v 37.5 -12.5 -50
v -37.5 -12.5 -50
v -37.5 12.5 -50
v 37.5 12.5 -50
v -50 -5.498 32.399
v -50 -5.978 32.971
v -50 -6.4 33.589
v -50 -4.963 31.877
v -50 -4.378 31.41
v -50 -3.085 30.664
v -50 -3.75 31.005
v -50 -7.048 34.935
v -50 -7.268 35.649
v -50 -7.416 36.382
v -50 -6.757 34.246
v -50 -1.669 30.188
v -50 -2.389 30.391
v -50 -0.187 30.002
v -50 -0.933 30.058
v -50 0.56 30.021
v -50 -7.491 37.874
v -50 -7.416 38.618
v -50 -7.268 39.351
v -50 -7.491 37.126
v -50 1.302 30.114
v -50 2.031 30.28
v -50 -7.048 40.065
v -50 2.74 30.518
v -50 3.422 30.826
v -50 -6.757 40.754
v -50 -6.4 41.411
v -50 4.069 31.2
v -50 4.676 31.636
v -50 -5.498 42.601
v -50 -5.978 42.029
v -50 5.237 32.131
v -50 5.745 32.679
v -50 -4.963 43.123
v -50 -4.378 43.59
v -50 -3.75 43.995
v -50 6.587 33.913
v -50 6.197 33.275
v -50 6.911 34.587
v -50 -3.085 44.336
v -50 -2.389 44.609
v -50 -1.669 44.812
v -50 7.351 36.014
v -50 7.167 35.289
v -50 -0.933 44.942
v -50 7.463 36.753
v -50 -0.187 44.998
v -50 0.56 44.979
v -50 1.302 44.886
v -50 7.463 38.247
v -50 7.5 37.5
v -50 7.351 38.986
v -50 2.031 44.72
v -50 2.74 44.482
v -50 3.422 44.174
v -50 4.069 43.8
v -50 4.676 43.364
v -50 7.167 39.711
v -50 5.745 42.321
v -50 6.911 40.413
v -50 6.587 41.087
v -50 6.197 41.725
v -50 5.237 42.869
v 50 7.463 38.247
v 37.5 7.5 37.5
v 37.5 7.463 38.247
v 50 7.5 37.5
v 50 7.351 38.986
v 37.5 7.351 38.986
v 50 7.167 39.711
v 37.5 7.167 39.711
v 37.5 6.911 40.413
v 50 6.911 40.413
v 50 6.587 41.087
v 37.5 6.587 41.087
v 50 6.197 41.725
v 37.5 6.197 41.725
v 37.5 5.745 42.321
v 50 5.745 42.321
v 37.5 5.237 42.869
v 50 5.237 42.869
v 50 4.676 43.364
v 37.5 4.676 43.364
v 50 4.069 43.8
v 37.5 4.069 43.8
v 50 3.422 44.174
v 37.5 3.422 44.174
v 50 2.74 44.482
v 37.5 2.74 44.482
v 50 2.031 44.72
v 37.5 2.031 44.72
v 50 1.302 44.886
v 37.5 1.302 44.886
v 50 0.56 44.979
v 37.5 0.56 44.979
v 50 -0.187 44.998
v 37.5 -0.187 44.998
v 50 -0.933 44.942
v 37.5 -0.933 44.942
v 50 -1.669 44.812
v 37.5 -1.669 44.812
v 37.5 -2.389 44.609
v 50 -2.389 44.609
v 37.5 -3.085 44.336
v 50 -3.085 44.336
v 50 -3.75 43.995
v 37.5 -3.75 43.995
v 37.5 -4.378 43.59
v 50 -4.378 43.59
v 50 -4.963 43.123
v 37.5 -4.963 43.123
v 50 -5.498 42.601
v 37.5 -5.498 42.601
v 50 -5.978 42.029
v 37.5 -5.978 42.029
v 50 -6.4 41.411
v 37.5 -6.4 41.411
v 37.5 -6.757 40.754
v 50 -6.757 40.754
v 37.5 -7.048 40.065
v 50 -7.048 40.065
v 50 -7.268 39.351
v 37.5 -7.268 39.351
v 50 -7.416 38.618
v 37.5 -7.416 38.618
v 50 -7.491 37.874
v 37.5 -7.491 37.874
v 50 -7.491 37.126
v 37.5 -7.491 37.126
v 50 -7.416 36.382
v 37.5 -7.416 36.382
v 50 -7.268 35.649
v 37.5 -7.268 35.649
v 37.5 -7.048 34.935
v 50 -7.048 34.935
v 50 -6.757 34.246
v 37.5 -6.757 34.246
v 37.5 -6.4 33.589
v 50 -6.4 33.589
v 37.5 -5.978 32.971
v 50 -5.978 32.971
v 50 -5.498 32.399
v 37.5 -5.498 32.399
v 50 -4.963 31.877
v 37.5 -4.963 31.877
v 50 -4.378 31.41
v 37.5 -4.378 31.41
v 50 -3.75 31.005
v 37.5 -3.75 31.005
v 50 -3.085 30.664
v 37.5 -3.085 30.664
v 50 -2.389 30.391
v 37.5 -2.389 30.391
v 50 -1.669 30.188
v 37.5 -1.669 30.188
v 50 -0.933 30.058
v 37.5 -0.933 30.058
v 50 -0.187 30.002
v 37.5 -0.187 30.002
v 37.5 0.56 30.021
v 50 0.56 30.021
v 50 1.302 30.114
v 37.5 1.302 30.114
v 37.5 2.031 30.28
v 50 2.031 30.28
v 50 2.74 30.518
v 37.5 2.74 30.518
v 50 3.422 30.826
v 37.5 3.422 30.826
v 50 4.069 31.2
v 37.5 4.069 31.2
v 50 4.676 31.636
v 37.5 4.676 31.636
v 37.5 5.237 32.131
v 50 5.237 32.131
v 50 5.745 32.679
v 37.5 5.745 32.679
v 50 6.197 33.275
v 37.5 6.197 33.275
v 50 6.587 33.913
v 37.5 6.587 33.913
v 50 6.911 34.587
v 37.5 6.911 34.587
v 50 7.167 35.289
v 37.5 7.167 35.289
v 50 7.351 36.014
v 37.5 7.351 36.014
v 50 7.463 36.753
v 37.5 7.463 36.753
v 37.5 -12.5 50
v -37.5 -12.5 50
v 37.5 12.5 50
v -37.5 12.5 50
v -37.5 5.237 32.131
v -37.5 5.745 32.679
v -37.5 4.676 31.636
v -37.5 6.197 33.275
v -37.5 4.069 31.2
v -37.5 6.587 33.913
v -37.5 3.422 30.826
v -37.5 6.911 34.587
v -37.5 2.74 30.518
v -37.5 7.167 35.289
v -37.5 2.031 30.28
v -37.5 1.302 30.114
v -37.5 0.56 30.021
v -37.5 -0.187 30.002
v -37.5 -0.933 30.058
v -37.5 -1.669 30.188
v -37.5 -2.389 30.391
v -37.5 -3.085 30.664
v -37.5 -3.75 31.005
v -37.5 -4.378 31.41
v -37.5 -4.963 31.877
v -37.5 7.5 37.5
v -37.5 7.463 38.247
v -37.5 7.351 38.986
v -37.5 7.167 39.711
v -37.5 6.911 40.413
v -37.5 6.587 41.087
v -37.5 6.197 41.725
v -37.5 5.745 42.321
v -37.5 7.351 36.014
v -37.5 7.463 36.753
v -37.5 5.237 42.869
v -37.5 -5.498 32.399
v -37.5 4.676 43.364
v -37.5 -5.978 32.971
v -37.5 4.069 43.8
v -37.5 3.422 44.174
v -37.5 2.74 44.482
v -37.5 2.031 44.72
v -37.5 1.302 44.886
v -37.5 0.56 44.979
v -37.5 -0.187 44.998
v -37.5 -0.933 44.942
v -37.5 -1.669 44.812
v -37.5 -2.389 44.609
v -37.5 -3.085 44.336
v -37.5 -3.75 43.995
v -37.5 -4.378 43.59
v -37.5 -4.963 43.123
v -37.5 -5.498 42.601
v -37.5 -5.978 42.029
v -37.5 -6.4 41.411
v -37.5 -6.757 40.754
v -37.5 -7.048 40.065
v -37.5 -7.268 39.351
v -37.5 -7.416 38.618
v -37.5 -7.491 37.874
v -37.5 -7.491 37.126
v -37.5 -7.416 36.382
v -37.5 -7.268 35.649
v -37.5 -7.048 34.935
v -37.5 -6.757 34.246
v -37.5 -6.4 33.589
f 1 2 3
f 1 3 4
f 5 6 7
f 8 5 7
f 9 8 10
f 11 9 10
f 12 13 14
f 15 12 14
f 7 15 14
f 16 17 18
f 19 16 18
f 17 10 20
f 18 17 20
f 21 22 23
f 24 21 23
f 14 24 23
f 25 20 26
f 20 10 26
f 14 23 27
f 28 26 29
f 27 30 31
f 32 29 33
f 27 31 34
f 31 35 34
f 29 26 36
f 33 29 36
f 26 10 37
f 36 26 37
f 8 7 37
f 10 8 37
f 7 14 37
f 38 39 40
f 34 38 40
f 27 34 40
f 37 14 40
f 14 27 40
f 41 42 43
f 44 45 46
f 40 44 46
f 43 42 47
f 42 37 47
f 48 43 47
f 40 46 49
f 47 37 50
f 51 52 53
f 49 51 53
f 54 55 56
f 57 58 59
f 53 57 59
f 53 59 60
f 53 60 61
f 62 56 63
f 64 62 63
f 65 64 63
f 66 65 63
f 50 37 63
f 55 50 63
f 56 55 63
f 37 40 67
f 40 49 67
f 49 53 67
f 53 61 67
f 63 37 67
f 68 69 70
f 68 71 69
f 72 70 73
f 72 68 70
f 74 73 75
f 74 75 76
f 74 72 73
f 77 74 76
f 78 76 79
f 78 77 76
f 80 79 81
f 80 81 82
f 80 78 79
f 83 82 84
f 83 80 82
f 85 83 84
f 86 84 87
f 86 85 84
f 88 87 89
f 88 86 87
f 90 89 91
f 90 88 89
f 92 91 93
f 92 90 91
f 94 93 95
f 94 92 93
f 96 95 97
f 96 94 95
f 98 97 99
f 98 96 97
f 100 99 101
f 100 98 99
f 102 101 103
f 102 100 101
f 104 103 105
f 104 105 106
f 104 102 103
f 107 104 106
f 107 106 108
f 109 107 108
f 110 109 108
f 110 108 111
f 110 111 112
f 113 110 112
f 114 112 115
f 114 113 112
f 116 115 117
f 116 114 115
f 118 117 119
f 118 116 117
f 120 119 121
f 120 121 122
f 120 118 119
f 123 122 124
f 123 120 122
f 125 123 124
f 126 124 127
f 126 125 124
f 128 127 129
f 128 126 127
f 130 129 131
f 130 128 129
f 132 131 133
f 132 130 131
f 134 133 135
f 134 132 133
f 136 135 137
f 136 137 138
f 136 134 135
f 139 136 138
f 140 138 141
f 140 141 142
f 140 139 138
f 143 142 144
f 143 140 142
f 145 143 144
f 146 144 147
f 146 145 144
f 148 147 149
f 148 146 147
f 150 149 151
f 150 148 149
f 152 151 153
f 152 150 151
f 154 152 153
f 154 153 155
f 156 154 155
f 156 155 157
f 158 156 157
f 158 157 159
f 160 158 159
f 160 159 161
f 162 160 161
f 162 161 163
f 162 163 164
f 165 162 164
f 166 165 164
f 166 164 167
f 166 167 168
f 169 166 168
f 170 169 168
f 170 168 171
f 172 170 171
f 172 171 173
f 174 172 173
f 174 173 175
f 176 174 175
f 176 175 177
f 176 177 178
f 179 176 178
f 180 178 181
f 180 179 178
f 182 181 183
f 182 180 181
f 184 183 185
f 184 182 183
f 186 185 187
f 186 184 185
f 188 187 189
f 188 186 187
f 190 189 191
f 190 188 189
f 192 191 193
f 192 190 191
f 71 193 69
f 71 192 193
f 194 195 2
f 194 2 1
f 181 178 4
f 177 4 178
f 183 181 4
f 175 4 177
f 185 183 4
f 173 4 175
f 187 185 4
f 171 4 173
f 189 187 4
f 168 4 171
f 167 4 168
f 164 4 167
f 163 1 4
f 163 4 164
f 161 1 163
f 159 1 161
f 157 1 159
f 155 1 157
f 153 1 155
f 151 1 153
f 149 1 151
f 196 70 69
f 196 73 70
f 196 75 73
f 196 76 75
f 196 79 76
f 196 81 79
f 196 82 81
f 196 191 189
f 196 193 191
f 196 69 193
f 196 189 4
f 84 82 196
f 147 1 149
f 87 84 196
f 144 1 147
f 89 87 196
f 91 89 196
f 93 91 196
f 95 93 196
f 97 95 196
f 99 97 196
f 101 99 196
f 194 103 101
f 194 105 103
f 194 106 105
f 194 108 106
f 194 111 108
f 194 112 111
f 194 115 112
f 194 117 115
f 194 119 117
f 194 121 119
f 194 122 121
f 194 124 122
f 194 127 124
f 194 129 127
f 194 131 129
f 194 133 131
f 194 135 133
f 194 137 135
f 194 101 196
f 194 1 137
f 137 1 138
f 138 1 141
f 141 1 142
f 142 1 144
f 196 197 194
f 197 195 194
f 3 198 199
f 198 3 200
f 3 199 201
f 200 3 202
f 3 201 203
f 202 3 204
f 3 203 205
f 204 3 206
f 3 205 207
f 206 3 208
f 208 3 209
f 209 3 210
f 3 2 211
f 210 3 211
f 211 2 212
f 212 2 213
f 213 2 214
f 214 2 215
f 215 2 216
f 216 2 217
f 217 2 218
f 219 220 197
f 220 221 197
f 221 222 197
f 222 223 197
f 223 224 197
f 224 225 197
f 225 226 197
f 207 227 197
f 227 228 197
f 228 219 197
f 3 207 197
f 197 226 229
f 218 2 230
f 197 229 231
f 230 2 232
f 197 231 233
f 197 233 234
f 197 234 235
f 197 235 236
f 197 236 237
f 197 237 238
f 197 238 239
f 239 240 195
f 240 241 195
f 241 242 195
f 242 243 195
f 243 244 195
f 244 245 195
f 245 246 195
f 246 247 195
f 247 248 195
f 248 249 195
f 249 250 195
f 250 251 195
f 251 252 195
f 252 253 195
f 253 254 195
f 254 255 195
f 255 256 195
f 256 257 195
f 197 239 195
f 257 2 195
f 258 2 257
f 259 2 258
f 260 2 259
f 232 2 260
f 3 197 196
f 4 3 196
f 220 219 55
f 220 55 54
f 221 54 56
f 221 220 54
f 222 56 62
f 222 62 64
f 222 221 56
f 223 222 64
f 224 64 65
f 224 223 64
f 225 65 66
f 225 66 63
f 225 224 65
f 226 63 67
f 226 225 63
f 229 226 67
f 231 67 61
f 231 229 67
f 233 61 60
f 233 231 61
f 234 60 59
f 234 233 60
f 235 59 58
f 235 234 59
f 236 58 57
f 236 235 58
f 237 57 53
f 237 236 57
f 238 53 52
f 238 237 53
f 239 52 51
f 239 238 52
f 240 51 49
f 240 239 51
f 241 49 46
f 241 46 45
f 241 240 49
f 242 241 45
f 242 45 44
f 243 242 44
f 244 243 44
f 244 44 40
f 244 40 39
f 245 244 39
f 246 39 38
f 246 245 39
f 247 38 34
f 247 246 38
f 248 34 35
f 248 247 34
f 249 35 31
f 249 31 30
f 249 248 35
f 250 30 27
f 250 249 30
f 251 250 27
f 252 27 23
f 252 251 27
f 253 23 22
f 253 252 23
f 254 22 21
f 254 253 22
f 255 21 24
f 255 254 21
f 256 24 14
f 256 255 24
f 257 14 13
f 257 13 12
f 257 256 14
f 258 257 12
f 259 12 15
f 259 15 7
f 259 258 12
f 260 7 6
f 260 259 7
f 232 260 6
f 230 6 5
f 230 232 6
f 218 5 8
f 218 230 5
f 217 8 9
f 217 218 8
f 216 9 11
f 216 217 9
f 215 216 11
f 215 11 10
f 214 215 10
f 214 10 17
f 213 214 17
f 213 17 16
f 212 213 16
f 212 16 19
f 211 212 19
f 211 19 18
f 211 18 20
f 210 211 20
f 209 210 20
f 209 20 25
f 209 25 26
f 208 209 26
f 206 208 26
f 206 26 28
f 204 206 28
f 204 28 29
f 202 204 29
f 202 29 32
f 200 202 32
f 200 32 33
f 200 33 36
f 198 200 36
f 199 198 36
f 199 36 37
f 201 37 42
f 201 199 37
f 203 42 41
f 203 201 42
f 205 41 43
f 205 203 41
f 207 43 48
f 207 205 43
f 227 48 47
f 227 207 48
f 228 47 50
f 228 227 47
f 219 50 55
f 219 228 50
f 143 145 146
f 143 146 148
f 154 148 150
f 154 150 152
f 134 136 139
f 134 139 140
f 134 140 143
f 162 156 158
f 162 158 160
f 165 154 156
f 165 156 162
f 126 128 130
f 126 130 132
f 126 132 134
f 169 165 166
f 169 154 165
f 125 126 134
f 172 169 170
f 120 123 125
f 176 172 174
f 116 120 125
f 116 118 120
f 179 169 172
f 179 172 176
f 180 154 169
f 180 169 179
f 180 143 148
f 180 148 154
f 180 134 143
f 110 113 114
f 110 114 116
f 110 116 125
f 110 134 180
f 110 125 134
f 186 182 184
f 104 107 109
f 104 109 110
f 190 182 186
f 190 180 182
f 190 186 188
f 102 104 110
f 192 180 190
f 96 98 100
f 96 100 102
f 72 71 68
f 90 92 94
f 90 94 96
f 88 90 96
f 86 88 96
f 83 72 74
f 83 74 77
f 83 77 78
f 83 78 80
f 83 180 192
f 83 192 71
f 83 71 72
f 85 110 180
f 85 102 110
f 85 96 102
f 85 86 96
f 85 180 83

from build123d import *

# Parameters (mm, degrees)
F0_W     = 75
F0_H     = 100
F1_DEPTH = 12.5
F2_R     = 7.5
F3_DEPTH = 50


with BuildPart() as f1:
    # F0 (on Front) → F1 (new body, symmetric)
    with BuildSketch(Plane.XZ):
        Rectangle(F0_W, F0_H)
    extrude(amount=F1_DEPTH, both=True)

    # F2 (on Right) → F3 (join, symmetric)
    with BuildSketch(Plane.YZ):
        with Locations((0, 37.5)):
            Circle(F2_R)
    extrude(amount=F3_DEPTH, both=True)


solid = f1.part
